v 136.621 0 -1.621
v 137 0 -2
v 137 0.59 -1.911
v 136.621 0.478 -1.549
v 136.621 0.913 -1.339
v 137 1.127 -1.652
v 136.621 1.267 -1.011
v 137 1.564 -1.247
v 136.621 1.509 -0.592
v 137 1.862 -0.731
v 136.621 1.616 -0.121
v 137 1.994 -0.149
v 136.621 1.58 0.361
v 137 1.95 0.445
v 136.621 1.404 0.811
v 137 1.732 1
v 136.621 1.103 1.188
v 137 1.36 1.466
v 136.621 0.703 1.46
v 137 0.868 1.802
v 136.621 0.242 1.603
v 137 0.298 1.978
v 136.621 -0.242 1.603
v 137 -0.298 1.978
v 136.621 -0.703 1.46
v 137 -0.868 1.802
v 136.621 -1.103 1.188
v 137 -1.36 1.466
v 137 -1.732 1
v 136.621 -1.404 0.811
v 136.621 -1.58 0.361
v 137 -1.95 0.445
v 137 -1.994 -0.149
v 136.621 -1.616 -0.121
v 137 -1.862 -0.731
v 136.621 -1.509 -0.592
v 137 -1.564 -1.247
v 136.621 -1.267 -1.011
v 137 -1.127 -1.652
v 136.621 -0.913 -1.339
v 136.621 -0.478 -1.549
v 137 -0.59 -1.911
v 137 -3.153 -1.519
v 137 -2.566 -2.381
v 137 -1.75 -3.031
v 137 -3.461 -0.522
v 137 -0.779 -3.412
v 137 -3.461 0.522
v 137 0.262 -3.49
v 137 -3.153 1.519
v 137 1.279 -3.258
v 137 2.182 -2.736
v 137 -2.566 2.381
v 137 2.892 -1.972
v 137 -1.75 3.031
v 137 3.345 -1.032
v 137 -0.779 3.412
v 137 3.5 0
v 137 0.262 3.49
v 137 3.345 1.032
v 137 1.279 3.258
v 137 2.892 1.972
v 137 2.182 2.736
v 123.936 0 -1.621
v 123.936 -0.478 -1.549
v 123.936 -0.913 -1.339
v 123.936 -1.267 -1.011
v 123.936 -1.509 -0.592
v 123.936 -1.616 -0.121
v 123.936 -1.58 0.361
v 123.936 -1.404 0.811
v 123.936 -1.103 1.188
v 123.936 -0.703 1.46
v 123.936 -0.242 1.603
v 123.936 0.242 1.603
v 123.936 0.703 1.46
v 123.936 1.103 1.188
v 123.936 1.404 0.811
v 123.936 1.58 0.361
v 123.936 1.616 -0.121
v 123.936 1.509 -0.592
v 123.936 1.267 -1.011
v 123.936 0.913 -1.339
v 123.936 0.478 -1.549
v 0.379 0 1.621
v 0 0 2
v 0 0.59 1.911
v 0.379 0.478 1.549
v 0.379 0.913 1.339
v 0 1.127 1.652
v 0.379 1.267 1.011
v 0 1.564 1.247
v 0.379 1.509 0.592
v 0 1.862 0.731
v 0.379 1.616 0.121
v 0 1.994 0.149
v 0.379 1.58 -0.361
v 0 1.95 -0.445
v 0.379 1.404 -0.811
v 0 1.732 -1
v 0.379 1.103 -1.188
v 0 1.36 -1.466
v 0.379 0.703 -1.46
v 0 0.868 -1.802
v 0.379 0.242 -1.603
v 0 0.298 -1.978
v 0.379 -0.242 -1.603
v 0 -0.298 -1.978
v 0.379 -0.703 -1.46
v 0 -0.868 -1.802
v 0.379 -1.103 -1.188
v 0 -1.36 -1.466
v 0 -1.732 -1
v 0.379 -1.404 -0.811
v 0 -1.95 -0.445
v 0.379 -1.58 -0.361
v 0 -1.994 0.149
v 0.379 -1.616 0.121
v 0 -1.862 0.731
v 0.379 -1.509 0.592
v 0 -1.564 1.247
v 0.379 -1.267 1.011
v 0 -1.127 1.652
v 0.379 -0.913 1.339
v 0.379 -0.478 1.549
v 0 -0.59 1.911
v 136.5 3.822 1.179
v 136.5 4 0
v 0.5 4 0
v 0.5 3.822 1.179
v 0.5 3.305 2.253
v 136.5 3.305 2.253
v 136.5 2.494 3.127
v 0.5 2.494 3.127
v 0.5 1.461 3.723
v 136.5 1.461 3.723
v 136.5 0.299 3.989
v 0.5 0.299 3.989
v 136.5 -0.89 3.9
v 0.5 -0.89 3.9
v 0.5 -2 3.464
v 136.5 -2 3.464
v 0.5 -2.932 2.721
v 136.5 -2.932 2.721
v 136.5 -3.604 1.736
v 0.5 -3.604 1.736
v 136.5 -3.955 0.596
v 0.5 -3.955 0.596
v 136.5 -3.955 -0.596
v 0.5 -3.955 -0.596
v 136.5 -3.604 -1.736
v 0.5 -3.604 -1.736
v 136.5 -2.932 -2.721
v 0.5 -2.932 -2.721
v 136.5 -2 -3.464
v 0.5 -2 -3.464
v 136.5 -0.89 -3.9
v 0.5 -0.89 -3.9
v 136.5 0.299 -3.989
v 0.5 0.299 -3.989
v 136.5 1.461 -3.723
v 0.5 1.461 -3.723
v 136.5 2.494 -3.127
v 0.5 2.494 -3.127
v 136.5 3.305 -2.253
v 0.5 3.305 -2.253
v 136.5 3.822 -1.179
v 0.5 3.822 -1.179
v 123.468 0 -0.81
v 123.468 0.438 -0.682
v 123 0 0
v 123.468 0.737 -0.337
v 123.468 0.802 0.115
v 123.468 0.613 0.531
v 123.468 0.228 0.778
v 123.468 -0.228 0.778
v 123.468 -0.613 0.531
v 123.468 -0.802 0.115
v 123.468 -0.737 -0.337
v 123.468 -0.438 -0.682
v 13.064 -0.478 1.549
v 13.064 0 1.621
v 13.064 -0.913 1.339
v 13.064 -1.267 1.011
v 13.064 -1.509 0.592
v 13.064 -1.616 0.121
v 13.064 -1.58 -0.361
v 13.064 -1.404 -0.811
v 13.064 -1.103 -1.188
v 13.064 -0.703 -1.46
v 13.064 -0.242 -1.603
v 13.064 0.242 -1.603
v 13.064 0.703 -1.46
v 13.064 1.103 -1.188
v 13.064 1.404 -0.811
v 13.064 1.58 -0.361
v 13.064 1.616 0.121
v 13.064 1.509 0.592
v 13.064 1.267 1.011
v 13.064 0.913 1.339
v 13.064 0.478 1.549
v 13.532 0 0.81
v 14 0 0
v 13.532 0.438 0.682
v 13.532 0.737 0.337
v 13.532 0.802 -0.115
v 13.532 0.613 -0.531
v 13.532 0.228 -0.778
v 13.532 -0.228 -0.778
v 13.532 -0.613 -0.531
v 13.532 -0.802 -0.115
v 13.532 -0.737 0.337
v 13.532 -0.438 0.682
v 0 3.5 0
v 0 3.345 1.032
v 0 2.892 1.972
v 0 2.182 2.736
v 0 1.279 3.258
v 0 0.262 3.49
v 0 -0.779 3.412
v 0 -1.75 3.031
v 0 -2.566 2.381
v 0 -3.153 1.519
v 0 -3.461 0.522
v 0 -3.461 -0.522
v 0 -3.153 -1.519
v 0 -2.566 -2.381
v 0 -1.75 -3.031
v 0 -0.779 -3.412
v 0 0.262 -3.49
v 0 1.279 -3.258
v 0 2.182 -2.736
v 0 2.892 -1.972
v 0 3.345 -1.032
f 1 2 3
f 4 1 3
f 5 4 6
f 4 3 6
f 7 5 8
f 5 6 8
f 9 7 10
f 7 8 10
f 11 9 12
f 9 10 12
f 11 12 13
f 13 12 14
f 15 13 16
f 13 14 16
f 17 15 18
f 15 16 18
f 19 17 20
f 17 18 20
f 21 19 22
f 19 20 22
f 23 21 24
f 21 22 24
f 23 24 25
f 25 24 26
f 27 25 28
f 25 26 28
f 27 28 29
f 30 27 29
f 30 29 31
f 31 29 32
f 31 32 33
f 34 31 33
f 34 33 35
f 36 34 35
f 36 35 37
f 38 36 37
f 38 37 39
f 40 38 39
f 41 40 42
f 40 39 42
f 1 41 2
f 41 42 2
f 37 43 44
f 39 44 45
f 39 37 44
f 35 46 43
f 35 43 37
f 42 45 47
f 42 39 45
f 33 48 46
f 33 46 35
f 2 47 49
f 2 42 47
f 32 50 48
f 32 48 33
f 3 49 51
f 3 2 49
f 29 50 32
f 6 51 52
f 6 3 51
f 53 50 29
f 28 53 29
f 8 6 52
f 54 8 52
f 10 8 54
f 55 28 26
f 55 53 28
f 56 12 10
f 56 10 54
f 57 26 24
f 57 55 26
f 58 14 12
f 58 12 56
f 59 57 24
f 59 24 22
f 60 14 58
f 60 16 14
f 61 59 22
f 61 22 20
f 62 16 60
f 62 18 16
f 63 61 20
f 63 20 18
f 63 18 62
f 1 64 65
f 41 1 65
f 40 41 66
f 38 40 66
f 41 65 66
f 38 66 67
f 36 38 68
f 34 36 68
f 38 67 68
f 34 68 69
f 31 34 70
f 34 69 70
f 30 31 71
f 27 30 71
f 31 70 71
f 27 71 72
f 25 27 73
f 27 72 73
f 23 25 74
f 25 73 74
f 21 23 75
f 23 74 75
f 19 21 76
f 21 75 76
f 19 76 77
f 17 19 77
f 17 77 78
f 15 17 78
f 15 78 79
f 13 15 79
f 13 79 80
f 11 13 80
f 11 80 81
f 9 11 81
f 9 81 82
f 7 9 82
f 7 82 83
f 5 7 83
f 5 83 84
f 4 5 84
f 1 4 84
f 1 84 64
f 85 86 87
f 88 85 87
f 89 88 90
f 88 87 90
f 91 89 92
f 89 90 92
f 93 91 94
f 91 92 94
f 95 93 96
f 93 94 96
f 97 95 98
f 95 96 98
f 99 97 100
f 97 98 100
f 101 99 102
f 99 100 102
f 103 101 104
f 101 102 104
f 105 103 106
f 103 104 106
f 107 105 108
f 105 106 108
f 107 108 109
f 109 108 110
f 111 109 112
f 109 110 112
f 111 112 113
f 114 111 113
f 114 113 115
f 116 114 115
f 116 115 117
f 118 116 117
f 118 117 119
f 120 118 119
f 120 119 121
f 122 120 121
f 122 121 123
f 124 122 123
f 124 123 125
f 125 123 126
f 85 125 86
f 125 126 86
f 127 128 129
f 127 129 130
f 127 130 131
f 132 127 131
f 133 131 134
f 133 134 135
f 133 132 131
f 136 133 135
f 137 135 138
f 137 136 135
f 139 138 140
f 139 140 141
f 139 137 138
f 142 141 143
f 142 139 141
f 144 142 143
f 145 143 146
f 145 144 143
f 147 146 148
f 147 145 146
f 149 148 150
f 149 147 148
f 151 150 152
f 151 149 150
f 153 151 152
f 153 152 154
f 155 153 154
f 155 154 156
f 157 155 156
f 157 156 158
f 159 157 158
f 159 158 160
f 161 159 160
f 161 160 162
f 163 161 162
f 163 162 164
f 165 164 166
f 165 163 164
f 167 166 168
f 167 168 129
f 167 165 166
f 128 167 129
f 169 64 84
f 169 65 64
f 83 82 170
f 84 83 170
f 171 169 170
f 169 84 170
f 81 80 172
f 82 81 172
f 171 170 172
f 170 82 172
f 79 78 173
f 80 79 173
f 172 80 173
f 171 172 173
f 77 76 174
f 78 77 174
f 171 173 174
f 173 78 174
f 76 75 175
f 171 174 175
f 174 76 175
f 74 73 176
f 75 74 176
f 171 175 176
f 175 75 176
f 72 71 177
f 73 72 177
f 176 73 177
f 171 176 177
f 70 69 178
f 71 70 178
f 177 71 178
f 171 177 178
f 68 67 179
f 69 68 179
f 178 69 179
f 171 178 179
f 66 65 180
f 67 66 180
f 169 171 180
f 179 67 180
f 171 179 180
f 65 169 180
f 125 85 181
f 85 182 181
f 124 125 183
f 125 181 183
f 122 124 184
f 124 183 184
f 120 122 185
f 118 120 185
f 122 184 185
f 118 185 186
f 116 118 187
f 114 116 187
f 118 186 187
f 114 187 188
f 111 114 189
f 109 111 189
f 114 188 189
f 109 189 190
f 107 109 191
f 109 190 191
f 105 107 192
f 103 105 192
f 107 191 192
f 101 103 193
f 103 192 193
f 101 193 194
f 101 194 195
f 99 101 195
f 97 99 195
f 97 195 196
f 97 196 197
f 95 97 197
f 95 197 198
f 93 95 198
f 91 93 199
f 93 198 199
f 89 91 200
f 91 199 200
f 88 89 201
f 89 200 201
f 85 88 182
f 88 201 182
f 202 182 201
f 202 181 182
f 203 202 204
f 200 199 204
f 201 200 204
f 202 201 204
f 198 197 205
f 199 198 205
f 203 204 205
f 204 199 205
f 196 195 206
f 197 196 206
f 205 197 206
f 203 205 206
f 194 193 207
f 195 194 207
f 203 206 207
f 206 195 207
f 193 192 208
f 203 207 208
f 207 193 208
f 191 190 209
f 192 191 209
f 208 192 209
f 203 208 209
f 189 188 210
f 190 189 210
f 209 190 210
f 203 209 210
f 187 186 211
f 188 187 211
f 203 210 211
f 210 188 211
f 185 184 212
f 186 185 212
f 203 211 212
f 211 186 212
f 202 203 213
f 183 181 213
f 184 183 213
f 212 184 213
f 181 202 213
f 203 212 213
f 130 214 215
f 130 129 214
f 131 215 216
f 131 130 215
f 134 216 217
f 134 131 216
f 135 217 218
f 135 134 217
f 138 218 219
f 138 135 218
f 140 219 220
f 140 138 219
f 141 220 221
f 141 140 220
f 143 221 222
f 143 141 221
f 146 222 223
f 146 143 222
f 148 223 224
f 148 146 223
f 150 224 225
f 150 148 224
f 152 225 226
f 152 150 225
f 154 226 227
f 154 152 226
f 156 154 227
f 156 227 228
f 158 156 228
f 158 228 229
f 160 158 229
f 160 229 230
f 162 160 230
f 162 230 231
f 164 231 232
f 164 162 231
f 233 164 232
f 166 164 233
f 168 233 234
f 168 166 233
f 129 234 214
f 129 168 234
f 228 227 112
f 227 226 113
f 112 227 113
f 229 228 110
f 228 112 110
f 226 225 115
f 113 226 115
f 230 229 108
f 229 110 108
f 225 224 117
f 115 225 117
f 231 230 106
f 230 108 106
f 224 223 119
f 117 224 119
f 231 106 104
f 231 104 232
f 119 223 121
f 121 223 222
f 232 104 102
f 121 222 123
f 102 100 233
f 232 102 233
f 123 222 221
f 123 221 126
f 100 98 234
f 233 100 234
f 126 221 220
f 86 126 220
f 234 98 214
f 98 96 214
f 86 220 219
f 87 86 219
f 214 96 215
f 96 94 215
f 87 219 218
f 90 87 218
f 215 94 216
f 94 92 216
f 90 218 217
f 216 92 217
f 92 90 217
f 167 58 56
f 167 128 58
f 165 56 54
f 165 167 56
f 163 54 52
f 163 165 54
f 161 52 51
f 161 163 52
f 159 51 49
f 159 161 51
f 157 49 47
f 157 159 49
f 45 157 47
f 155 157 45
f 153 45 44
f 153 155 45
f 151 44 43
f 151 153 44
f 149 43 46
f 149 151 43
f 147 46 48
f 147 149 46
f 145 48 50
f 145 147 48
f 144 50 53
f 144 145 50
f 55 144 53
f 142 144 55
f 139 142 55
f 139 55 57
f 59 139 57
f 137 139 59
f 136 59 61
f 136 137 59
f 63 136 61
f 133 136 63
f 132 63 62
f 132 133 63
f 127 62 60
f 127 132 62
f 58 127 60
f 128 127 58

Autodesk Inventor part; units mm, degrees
ref_plane "YZ Plane" through (0, 0, 0) normal (1, 0, 0) x (0, 1, 0)
ref_plane "XZ Plane" through (0, 0, 0) normal (0, 1, 0) x (-1, 0, 0)
ref_plane "XY Plane" through (0, 0, 0) normal (0, 0, 1) x (1, 0, 0)
sketch "Sketch_1" plane through (0, 0, 0) normal (0, 0, 1) x (1, 0, 0)
  line L0 (137, 0) -> (0, 0)
  line L1 (0, 0) -> (0, 3.5)
  line L2 (0, 3.5) -> (0.5, 4)
  line L3 (0.5, 4) -> (136.5, 4)
  line L4 (136.5, 4) -> (137, 3.5)
  line L5 (137, 3.5) -> (137, 0)
  line L6 (137, 0) -> (0, 0)
revolve "Revolution1" add sketch "Sketch_1" angle 360 about axis through (137, 0, 0) along (1, 0, 0)
sketch "Sketch2" plane through (0, 0, 0) normal (-1, 0, 0) x (0, 0, 1)
  point P0 (0, 0)
hole "Hole1" at (0, 0, 0) direction (1, 0, 0) diameter 3.242 depth 13.0641 tip angle 120 countersink diameter 4 countersink angle 90 thread size "M4x0.7" class "6H" standard "ISO Metric profile"
sketch "Sketch3" plane through (137, 0, 0) normal (1, 0, 0) x (0, 0, -1)
  point P0 (0, 0)
hole "Hole2" at (137, 0, 0) direction (-1, 0, 0) diameter 3.242 depth 13.0641 tip angle 120 countersink diameter 4 countersink angle 90 thread size "M4x0.7" class "6H" standard "ISO Metric profile"
properties part number "SFHRW8-137-M4-N4_s" material "鋼、炭素鋼"
